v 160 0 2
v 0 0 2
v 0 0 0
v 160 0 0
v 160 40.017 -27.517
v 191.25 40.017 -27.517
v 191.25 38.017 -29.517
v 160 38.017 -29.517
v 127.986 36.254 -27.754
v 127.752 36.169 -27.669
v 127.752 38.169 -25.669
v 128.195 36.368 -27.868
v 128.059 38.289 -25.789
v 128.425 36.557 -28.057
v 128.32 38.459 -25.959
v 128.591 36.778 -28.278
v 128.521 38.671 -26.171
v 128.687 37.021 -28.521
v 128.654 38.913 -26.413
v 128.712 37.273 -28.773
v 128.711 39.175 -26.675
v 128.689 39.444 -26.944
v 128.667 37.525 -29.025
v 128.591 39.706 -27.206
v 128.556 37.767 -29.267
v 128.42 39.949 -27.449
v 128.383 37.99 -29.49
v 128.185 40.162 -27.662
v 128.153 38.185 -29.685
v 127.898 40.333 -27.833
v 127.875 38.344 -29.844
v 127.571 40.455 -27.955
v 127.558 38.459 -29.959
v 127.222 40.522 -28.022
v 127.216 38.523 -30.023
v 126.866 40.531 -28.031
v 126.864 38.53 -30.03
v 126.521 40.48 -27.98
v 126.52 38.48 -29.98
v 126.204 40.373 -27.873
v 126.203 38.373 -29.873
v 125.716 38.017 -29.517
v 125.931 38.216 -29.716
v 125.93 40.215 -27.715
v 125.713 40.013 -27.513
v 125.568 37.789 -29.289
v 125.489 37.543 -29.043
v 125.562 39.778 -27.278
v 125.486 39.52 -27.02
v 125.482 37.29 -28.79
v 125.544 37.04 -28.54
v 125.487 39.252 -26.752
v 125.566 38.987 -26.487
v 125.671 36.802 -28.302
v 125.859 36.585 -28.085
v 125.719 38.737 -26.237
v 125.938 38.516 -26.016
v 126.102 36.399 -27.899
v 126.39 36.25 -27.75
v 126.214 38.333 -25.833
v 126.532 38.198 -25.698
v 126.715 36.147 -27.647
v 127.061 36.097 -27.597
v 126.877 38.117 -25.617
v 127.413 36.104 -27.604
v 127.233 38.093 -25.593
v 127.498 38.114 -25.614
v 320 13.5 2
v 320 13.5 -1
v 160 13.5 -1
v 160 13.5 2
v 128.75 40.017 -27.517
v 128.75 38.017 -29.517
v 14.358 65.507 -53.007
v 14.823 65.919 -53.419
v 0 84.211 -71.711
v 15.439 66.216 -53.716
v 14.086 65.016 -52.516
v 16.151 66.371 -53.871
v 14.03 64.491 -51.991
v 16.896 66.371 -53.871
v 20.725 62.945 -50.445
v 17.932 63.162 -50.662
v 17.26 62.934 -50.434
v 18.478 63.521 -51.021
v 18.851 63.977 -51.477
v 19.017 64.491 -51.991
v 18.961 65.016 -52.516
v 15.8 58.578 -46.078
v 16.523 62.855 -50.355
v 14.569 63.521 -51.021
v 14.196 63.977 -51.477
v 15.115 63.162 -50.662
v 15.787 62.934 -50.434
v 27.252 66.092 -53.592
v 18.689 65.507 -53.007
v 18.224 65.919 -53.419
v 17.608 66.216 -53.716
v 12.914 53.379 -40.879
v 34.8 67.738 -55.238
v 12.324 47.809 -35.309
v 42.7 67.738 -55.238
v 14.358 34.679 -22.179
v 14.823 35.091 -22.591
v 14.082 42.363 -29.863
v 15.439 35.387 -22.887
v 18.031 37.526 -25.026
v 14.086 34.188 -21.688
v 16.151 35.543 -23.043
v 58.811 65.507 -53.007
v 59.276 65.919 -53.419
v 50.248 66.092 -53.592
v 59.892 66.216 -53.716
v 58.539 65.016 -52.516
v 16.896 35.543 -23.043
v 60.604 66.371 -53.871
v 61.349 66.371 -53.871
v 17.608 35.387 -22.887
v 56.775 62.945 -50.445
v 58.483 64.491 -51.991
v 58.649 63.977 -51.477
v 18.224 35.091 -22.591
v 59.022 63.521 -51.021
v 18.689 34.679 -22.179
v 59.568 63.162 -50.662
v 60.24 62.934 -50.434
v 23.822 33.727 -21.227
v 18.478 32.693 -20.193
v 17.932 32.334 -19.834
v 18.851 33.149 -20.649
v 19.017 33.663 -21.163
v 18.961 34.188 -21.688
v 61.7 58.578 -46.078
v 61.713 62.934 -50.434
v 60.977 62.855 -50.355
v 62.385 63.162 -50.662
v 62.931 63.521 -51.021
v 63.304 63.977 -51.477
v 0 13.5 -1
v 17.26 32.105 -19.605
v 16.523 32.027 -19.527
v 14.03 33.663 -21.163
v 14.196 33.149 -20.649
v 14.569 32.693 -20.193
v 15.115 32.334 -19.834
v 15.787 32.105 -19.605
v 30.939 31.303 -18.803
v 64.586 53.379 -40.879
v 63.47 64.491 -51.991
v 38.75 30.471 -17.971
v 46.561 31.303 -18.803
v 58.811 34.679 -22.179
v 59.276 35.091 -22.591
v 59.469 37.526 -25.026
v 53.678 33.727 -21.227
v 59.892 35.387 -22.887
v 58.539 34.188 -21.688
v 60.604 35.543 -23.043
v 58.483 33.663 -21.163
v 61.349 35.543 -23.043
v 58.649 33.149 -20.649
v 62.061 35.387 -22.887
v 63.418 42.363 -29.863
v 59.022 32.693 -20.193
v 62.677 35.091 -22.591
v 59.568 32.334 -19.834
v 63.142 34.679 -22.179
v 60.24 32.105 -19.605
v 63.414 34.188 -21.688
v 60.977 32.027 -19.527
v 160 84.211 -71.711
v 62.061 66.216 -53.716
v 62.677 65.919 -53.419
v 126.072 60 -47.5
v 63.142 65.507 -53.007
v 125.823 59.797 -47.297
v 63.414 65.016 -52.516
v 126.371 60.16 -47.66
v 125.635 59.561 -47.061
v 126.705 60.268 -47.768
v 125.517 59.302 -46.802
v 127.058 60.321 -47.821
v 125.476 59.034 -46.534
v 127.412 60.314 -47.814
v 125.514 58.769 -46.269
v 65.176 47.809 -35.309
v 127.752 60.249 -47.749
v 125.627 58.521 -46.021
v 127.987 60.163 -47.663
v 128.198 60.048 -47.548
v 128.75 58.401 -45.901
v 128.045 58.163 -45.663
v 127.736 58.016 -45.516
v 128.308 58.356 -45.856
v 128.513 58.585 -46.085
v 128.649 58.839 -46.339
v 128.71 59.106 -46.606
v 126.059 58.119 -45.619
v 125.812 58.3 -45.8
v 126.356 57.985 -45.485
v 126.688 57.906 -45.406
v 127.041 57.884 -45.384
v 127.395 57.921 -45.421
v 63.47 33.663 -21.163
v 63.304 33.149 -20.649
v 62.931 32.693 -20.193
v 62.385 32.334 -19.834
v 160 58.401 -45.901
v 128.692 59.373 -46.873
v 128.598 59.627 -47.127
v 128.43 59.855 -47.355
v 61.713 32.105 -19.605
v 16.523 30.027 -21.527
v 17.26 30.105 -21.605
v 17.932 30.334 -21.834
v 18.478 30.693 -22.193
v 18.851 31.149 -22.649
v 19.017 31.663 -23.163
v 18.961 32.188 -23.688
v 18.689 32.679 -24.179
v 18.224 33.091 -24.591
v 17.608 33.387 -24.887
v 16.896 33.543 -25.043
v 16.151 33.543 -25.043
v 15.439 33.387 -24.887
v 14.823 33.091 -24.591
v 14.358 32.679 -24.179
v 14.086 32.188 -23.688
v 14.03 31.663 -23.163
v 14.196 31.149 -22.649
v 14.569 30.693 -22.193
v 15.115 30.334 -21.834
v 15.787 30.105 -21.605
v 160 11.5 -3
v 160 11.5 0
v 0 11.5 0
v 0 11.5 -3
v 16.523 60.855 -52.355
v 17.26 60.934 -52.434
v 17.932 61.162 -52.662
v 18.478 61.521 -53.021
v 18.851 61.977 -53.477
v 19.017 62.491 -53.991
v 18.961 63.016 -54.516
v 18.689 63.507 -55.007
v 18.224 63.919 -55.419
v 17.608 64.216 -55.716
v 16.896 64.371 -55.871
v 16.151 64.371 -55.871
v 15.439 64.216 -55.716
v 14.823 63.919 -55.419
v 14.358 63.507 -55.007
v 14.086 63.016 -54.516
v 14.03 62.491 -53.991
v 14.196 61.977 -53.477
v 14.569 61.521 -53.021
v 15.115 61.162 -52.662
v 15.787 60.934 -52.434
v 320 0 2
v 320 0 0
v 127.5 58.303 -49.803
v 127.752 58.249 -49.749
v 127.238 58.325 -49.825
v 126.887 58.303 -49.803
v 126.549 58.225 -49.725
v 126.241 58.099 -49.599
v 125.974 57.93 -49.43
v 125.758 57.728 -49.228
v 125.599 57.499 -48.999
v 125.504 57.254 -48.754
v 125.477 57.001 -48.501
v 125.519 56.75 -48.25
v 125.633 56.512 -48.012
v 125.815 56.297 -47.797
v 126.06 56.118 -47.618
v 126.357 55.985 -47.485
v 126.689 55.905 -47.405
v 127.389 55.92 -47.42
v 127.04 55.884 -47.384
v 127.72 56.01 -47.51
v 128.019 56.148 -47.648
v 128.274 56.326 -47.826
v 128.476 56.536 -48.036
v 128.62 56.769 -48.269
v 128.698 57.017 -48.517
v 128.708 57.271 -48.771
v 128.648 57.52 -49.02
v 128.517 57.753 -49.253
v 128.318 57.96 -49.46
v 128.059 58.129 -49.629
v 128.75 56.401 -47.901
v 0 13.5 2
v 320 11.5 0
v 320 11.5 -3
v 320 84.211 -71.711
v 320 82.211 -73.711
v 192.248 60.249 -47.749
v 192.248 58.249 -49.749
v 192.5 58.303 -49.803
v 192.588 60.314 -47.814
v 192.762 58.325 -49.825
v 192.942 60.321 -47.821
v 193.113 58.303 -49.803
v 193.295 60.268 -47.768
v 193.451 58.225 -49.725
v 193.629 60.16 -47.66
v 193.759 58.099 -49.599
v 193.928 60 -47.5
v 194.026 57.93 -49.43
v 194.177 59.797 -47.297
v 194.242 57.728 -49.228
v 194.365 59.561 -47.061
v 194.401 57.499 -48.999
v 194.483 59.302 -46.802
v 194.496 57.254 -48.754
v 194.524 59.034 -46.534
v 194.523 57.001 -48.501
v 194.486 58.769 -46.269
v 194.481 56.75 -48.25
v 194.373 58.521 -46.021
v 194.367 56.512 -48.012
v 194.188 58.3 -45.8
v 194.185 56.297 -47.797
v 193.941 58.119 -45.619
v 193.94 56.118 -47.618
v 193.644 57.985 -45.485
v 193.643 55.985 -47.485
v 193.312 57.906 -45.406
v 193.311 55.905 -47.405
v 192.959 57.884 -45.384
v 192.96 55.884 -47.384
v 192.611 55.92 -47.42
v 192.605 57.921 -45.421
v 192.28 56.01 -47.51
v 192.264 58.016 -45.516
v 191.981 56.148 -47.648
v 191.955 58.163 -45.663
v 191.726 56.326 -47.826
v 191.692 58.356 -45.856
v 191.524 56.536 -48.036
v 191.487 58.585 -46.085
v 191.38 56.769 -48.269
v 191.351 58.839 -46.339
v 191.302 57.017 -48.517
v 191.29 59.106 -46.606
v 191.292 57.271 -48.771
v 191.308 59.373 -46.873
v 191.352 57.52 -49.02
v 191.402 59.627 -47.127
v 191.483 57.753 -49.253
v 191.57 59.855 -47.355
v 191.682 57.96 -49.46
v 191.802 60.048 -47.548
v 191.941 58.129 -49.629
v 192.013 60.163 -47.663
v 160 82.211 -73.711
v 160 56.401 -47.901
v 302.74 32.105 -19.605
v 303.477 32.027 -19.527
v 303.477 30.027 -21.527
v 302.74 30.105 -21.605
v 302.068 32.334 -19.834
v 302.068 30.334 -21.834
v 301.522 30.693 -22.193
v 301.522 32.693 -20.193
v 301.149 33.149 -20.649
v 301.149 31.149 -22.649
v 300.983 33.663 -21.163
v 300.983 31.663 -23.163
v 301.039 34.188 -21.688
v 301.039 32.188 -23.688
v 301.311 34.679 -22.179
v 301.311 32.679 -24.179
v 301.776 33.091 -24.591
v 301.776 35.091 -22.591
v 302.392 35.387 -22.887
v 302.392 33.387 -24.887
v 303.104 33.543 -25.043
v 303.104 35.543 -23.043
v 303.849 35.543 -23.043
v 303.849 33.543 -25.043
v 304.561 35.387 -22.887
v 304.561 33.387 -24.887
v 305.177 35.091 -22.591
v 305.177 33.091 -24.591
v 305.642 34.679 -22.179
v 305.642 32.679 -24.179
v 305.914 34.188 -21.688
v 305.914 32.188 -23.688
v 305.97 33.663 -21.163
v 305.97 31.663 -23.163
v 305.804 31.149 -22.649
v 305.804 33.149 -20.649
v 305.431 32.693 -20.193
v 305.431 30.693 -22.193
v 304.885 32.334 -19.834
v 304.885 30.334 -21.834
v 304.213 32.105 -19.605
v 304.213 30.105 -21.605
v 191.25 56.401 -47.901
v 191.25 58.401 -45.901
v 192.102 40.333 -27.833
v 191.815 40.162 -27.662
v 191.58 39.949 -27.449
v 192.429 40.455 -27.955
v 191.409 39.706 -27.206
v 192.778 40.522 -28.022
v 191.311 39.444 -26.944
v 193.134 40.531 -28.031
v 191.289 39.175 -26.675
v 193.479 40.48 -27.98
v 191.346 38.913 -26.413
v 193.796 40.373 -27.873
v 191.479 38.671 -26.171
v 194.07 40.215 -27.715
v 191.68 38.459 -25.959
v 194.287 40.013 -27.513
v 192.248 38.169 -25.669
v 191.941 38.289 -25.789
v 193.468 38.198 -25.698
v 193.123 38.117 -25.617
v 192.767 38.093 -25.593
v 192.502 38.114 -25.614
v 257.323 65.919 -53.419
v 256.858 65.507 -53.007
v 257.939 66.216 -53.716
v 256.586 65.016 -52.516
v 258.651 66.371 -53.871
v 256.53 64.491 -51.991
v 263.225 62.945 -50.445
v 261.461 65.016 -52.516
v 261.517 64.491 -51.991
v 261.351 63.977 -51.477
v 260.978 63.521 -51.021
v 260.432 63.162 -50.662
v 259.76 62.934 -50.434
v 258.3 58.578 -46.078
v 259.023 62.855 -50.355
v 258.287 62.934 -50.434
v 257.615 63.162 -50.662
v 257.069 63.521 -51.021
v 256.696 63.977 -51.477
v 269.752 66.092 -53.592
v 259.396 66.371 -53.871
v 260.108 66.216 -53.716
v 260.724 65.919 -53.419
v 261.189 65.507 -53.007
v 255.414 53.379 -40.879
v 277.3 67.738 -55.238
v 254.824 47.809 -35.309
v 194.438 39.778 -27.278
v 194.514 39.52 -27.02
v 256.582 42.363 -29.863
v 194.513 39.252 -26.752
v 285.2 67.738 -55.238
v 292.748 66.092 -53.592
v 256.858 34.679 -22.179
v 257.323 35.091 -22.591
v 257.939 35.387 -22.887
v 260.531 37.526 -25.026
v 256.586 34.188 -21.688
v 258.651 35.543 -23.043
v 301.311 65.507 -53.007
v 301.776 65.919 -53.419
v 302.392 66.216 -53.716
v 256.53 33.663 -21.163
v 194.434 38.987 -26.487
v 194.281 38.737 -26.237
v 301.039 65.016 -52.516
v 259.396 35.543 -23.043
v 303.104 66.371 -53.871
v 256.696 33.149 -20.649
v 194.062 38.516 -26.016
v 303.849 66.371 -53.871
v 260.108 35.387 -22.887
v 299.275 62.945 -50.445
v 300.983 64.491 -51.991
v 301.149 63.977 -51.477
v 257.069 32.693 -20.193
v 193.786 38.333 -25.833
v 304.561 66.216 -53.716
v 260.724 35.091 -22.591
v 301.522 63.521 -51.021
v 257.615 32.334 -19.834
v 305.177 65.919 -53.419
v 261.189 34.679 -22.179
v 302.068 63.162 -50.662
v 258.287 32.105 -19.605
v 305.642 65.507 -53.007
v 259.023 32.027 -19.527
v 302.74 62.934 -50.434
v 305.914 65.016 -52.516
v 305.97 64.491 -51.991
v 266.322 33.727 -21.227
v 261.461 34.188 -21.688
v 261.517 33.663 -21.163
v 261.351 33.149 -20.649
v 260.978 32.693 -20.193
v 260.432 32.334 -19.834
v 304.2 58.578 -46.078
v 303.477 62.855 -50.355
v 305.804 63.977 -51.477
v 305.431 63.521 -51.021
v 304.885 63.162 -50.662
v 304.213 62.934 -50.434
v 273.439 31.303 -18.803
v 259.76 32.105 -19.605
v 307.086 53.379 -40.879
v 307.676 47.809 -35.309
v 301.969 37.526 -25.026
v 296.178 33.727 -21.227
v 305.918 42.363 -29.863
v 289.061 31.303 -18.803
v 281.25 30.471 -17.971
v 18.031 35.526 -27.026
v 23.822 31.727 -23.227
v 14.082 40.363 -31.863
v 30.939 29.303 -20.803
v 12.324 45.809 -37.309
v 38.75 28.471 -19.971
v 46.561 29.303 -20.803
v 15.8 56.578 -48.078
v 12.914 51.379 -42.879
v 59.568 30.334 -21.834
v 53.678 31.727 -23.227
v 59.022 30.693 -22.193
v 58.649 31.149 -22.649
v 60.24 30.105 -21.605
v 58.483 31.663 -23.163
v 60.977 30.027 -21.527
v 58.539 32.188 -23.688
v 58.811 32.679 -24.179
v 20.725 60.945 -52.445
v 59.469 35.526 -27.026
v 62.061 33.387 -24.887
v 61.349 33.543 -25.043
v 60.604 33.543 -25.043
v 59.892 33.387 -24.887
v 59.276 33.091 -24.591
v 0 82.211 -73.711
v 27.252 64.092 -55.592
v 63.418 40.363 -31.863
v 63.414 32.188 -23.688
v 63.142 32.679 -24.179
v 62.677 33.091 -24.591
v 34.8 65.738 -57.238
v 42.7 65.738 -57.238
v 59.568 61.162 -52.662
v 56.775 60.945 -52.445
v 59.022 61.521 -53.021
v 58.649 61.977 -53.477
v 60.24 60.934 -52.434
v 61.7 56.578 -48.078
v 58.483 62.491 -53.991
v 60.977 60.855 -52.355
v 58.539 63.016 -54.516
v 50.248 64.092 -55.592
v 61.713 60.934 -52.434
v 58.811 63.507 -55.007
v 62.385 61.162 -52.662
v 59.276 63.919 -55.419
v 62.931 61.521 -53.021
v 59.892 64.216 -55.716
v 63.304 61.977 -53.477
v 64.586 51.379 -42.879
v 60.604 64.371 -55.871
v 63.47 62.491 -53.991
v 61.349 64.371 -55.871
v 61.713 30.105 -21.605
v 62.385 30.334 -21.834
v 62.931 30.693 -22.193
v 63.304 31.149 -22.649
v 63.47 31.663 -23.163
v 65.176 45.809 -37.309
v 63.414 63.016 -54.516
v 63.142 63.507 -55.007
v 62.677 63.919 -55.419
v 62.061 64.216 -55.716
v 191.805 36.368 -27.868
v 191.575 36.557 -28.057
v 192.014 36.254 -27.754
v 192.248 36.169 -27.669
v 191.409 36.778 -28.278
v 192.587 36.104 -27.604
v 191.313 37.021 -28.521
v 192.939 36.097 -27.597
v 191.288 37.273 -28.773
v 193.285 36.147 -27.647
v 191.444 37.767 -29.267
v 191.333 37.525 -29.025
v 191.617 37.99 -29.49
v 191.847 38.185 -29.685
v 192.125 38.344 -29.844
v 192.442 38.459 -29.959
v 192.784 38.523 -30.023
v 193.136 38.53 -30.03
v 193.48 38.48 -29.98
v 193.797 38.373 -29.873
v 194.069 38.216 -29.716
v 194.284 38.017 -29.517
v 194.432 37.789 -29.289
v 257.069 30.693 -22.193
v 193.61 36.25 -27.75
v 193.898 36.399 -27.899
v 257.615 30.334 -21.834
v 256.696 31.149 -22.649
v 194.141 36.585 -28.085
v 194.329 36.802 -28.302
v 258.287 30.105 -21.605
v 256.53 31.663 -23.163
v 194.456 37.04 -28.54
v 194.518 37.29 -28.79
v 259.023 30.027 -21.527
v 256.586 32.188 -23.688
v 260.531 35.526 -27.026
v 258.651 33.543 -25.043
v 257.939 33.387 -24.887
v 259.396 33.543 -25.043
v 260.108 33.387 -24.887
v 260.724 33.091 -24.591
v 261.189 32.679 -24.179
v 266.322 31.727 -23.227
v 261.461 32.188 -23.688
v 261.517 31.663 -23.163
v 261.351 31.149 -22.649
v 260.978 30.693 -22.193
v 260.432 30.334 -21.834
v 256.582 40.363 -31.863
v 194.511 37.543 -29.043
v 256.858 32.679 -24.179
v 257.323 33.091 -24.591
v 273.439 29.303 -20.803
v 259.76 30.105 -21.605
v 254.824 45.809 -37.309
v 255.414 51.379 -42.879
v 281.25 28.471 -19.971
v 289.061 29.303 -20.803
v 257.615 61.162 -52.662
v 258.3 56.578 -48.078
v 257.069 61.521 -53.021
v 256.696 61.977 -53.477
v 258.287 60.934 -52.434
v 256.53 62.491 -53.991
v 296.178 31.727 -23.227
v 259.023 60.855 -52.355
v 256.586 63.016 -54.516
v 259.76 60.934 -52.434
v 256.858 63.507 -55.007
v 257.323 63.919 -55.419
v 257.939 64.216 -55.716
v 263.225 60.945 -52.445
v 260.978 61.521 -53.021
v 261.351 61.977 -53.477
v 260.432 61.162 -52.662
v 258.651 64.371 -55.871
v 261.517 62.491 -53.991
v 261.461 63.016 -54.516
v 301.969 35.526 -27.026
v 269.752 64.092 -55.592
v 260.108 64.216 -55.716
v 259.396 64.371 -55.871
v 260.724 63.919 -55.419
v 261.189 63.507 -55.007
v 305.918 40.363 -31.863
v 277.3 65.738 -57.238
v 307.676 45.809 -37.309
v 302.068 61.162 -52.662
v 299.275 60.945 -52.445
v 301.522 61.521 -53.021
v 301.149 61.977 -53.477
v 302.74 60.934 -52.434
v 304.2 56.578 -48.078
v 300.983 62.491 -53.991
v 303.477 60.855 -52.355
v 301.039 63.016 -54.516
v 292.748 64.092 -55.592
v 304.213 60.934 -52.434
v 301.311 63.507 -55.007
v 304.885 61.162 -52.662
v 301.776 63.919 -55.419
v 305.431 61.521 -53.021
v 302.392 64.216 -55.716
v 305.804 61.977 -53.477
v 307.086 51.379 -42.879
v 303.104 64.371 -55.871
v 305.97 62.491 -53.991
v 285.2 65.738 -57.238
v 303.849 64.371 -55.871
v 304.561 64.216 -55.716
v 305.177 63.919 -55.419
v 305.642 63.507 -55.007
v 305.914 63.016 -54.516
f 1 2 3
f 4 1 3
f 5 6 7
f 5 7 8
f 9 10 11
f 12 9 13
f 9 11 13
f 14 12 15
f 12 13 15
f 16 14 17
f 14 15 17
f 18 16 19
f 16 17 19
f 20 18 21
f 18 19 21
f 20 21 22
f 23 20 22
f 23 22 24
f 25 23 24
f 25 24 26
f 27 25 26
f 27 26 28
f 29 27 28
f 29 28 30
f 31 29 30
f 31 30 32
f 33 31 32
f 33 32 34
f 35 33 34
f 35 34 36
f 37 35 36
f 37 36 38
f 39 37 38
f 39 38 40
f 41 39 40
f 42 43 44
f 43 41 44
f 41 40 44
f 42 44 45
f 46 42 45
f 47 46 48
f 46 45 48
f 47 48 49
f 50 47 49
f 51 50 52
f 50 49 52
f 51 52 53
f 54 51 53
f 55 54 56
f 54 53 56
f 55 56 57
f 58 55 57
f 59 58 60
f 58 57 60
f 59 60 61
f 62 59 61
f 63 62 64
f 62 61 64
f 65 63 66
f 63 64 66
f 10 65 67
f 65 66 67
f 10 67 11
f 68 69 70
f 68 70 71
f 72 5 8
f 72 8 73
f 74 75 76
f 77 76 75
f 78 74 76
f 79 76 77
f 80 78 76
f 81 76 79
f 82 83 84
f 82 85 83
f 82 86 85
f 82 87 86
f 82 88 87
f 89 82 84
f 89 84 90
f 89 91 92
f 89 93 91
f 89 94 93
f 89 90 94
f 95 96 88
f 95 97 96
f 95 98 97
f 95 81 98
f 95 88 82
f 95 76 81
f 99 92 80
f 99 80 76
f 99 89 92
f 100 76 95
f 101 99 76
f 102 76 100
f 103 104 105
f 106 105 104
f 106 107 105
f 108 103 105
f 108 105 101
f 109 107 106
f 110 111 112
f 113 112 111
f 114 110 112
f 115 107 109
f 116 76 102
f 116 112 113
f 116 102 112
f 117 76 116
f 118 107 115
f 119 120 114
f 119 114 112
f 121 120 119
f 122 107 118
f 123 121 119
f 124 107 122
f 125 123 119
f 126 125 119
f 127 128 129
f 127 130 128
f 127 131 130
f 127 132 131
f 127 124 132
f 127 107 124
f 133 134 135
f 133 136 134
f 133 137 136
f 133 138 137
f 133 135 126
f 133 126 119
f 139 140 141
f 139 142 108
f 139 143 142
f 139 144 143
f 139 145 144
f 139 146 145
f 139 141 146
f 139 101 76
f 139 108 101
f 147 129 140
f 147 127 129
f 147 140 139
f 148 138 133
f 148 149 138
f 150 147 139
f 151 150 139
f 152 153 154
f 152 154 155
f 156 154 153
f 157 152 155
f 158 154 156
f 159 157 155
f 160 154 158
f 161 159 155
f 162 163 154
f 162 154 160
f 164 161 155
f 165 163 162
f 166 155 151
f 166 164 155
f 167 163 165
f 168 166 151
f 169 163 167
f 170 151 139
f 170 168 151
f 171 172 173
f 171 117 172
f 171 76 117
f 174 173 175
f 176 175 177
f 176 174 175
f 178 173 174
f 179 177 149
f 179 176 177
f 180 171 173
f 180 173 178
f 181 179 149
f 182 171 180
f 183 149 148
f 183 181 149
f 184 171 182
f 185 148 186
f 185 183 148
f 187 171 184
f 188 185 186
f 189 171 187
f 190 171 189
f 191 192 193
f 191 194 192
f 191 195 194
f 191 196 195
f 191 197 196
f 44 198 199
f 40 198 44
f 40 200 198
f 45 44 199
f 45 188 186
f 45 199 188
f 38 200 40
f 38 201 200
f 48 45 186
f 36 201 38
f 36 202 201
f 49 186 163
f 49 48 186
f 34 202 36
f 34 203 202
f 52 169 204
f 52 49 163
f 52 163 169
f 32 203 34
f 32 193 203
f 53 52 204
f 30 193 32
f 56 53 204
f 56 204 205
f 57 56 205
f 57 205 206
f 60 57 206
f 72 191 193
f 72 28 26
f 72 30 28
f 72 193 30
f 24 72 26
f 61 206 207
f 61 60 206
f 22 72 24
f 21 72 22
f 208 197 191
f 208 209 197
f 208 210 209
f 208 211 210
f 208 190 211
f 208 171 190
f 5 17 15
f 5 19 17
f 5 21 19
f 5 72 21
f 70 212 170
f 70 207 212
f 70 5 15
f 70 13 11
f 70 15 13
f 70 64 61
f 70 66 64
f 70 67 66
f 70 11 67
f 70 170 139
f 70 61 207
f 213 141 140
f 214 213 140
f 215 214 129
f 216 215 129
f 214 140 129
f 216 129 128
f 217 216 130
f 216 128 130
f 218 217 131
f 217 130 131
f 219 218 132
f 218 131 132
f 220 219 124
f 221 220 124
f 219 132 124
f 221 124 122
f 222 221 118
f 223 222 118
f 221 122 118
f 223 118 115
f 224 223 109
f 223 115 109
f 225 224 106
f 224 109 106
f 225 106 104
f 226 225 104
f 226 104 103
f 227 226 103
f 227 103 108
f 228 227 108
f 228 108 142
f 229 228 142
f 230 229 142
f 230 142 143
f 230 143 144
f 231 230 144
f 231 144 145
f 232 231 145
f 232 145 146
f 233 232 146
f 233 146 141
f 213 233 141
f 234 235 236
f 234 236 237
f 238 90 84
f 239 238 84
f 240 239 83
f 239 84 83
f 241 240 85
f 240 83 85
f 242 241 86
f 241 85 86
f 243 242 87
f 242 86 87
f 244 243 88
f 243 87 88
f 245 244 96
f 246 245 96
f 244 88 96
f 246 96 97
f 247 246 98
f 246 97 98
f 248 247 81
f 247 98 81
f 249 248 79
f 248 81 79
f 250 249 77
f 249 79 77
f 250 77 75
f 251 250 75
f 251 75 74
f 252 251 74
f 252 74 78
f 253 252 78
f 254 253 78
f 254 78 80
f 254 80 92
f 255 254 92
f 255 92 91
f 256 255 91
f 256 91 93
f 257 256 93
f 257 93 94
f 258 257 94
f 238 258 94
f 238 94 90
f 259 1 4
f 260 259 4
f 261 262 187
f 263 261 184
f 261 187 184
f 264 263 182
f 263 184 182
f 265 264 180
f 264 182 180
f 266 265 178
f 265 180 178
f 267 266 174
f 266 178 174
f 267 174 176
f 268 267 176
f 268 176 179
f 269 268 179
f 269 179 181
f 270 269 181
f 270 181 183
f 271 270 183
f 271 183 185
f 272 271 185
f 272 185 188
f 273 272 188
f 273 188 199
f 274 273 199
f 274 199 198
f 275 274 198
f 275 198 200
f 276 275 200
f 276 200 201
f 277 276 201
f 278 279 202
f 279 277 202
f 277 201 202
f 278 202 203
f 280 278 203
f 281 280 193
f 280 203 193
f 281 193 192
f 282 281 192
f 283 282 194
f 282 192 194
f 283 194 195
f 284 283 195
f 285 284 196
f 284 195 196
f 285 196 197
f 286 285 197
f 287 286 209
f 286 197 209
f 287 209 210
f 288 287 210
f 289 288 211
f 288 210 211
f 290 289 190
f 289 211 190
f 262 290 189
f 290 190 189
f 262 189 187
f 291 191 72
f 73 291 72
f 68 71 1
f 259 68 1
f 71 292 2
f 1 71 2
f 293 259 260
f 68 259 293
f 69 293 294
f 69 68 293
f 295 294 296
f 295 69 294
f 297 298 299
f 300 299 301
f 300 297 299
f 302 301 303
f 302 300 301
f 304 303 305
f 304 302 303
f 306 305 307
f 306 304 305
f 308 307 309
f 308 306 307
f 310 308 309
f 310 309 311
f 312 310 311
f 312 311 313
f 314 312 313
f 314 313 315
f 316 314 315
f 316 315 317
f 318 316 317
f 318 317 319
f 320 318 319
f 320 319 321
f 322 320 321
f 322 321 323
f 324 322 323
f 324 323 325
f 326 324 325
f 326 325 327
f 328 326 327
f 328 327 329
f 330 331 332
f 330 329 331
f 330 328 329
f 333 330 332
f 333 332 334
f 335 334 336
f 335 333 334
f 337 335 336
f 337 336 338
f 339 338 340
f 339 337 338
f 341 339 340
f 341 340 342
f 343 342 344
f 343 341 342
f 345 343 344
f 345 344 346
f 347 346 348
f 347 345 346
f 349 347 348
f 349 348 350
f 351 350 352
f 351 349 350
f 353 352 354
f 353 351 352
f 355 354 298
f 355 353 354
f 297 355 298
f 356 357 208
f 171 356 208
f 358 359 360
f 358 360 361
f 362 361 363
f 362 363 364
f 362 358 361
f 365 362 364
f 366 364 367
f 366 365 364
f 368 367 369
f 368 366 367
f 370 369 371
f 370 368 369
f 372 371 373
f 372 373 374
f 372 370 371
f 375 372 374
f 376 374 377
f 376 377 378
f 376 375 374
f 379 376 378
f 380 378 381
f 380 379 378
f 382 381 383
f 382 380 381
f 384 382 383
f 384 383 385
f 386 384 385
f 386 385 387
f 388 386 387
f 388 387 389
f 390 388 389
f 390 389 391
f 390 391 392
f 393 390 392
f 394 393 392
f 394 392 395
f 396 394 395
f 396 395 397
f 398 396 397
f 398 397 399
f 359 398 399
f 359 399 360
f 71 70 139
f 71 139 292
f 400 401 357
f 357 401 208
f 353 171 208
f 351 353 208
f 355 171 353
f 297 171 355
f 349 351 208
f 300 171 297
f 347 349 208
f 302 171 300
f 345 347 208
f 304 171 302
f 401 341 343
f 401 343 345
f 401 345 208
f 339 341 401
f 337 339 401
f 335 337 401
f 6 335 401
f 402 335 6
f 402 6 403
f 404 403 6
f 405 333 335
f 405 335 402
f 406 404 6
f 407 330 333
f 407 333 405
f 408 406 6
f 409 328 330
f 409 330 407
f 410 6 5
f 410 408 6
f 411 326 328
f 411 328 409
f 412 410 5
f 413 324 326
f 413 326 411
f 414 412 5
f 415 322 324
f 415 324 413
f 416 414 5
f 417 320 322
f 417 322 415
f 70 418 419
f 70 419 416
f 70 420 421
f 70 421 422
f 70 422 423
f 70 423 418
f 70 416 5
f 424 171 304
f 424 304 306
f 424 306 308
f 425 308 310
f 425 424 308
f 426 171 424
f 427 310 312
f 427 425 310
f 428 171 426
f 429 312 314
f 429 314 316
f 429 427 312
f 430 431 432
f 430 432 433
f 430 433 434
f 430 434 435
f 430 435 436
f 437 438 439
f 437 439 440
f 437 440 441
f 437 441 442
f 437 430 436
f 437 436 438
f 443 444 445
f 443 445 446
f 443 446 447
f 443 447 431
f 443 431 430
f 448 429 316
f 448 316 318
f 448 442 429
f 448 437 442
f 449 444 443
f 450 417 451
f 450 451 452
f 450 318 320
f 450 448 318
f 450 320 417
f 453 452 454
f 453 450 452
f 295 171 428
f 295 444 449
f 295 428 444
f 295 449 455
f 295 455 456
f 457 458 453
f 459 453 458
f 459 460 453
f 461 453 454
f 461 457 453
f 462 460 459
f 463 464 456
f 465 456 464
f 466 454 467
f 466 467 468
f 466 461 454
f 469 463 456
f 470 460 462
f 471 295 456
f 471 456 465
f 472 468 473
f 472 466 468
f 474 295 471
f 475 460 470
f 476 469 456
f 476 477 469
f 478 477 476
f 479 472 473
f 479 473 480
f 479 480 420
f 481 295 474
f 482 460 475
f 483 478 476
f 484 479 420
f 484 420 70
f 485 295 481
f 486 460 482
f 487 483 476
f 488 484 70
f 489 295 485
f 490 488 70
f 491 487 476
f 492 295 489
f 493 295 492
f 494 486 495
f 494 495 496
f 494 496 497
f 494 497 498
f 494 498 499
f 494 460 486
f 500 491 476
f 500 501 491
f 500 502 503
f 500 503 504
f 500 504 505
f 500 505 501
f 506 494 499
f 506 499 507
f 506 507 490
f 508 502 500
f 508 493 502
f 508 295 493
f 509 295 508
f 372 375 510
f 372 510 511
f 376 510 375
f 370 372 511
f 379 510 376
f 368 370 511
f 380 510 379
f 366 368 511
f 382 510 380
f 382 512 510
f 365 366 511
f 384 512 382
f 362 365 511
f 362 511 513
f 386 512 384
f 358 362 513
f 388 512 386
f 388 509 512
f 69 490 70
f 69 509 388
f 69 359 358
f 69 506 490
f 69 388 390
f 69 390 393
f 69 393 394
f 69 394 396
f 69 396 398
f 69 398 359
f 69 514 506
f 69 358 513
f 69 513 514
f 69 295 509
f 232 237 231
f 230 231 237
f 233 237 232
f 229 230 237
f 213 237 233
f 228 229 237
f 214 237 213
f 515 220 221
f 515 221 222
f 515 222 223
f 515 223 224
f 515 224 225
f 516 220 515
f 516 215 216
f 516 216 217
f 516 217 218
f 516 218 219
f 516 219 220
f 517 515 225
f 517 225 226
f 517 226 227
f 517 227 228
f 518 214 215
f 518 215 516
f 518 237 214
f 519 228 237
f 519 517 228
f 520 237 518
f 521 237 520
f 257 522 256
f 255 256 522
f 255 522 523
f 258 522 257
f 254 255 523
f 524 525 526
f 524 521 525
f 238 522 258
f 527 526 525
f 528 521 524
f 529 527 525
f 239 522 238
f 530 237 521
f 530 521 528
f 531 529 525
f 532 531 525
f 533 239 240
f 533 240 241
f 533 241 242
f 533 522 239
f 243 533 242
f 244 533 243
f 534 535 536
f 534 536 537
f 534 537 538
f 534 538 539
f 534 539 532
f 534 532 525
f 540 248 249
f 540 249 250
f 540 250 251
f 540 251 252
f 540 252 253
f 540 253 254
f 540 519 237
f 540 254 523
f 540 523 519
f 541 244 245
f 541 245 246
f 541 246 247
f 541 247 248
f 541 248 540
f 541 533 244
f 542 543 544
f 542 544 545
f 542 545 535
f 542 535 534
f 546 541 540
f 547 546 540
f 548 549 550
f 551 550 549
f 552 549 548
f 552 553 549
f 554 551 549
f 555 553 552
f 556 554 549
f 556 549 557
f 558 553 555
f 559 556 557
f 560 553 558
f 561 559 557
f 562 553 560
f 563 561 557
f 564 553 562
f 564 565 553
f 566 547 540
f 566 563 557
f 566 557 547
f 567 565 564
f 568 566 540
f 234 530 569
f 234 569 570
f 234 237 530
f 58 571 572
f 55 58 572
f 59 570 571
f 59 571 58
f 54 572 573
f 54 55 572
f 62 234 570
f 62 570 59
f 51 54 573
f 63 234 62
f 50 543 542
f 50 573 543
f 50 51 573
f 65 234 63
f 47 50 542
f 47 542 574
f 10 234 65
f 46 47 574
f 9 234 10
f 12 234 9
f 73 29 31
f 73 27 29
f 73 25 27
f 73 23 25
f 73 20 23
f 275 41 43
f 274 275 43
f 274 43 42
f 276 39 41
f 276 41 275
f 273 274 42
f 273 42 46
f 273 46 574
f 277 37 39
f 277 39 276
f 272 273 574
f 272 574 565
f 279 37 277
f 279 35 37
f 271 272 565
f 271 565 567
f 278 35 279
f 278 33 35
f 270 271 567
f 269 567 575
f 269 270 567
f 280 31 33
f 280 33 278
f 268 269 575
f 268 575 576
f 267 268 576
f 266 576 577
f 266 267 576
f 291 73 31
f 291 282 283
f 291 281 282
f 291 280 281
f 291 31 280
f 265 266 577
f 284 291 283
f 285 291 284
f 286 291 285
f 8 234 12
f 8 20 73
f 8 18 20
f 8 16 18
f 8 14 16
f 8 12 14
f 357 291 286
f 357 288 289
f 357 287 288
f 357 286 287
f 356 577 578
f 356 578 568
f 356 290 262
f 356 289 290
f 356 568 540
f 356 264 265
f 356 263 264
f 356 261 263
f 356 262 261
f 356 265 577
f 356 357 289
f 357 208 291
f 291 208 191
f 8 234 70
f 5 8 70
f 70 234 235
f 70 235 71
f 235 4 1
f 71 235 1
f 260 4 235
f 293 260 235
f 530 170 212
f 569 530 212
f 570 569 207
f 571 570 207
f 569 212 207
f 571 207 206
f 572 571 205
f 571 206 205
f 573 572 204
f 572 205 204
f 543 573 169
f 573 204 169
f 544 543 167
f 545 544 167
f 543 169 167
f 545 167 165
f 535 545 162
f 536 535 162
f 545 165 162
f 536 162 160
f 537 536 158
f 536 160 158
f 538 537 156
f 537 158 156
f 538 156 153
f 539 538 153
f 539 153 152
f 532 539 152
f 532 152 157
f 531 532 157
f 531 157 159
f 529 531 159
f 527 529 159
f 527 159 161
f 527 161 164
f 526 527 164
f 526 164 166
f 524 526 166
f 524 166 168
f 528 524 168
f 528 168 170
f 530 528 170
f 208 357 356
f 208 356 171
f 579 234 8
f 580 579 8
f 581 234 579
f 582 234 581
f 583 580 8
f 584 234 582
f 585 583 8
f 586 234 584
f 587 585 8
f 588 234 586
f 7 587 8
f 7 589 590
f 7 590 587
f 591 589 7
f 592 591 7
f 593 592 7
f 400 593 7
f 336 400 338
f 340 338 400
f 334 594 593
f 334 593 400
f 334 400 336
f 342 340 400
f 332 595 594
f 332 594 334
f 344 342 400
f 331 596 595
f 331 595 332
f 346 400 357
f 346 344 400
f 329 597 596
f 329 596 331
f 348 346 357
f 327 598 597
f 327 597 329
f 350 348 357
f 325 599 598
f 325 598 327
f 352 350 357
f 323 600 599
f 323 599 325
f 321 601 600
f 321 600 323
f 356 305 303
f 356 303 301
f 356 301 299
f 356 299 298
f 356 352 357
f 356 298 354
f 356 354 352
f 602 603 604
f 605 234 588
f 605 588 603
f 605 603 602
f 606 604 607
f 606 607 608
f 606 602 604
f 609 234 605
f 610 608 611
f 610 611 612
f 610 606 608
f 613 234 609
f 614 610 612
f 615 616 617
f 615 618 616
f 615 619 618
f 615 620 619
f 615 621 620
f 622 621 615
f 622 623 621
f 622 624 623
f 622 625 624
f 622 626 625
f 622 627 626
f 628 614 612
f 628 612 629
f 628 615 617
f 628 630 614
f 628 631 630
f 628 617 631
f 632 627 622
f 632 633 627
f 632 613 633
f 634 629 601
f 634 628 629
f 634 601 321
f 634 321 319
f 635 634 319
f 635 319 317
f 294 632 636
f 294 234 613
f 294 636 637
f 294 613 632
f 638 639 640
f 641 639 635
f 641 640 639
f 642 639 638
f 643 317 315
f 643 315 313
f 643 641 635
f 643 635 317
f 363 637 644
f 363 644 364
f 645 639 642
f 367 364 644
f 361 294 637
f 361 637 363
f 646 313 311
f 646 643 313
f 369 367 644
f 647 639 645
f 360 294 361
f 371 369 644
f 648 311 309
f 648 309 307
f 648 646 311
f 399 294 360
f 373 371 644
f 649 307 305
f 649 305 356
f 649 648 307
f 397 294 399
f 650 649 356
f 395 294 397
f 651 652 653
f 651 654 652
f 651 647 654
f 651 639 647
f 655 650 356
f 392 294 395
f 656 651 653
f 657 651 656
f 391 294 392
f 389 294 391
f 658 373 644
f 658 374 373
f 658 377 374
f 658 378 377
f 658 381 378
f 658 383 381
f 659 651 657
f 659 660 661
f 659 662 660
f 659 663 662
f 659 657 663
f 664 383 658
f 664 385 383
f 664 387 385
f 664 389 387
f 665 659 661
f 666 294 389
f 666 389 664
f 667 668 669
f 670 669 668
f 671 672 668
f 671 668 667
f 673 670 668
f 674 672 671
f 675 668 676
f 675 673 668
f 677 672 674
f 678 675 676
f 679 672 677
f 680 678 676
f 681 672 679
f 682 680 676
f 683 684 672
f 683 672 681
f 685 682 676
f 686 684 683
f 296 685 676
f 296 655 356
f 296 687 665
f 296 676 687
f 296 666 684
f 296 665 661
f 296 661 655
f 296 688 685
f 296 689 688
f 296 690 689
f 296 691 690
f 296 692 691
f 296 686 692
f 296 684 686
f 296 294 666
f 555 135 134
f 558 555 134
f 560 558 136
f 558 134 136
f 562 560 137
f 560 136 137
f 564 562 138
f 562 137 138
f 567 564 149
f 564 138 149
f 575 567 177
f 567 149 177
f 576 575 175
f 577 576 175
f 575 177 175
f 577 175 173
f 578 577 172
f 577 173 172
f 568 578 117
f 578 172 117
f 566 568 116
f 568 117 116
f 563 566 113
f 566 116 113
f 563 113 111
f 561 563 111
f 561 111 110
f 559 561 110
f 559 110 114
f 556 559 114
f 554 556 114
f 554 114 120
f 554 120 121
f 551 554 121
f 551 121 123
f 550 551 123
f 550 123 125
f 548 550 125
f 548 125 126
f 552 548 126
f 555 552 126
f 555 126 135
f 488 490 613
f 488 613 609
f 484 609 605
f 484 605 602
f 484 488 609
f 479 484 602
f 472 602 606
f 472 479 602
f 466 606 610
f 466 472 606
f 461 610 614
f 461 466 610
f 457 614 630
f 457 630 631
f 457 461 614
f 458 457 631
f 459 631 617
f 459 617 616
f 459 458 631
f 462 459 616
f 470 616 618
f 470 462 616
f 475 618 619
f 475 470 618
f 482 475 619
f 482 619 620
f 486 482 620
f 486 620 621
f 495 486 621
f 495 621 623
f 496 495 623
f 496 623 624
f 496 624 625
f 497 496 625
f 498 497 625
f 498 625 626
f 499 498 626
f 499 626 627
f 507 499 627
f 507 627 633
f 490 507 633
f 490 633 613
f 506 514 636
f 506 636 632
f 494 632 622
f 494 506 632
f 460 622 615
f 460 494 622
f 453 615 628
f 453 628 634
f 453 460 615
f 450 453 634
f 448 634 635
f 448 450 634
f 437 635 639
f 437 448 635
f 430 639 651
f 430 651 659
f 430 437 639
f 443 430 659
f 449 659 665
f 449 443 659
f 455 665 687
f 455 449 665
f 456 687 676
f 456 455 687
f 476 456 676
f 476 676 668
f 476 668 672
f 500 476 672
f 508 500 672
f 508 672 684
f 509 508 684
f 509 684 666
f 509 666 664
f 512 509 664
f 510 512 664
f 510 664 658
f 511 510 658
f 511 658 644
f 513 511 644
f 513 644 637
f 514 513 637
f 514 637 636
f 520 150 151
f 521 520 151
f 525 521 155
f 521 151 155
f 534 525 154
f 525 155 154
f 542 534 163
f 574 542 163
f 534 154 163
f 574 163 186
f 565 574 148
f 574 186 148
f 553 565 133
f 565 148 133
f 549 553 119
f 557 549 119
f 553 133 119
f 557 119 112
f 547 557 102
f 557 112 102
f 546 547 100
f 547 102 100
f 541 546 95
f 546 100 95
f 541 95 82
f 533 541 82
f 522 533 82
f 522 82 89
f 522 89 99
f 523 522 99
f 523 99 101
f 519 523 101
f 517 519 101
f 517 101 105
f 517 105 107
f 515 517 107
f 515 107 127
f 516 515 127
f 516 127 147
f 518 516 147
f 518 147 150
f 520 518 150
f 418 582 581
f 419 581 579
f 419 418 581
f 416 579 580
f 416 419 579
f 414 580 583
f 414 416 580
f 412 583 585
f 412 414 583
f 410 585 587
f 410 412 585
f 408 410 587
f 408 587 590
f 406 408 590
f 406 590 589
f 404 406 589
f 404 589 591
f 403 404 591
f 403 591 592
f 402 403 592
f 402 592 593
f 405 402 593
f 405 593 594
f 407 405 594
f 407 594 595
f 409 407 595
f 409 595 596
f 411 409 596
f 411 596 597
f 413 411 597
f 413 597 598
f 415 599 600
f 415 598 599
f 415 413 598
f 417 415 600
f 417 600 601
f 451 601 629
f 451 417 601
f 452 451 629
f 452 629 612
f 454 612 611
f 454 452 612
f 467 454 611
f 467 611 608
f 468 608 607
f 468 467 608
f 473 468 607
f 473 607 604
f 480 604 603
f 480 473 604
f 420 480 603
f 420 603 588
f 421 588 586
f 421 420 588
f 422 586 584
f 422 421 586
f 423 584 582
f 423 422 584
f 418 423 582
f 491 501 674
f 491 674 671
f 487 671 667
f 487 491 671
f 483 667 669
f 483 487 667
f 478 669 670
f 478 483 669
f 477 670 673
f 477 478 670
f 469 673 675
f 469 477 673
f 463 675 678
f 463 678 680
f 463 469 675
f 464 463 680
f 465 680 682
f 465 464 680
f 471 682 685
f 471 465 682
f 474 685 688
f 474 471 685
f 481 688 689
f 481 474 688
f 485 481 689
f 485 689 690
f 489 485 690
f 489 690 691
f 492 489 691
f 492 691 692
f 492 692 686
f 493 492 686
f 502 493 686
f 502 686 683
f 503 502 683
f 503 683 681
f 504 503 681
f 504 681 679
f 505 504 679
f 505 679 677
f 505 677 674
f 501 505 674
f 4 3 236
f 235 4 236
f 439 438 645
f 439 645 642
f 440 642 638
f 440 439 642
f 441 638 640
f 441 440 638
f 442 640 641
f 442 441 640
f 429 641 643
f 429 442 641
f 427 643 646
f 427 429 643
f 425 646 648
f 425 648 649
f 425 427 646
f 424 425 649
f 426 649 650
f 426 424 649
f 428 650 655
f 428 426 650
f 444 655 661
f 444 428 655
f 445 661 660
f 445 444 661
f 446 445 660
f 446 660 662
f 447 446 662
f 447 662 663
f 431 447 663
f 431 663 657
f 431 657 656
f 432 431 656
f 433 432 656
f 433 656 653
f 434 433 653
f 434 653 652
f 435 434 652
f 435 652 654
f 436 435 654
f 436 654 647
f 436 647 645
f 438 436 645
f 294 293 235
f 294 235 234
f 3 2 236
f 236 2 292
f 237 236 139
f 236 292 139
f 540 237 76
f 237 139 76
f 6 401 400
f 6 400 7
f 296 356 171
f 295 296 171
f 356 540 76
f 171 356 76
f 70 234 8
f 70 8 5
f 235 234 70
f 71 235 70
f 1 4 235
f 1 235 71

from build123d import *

# Parameters (mm, degrees)
BOSS_EXTRUDE1_DEPTH = 160
BOSS_EXTRUDE2_DEPTH = 160
SKETCH4_W           = 31.25
SKETCH4_H           = 13.5
SKETCH4_H_2         = 12.5
CUT_EXTRUDE1_DEPTH  = 10
SKETCH5_RX          = 1.746988937
SKETCH5_RY          = 1.595946068
CUT_EXTRUDE2_DEPTH  = 10
SKETCH6_R           = 26.5
CUT_EXTRUDE3_DEPTH  = 10
SKETCH7_R           = 2.5
CUT_EXTRUDE4_DEPTH  = 10


with BuildPart() as part:
    # Sketch1 → Boss-Extrude1 (new body)
    with BuildSketch(Plane(origin=(0, 0, 0), x_dir=(0, 0, -1), z_dir=(1, 0, 0))):
        Polygon((0, 0), (0, 11.5), (3, 11.5), (3, 13.5), (-2, 13.5), (-2, 0), align=None)
    extrude(amount=BOSS_EXTRUDE1_DEPTH)

    # Sketch2 → Boss-Extrude2 (add)
    with BuildSketch(Plane(origin=(0, 0, 0), x_dir=(0, 0, -1), z_dir=(1, 0, 0))):
        Polygon((3, 13.5), (3, 11.5), (24.213203436, 32.713203436), (73.710678119, 82.210678119), (71.710678119, 84.210678119), (22.213203436, 34.713203436), (1, 13.5), align=None)
    extrude(amount=BOSS_EXTRUDE2_DEPTH)

    # Sketch4 → Cut-Extrude1 (cut)
    with BuildSketch(Plane(origin=(0, 6.25, 6.25), x_dir=(1, 0, 0), z_dir=(0, 0.7071067811865477, 0.7071067811865475))):
        with Locations((144.375, 67.003048327)):
            Rectangle(SKETCH4_W, SKETCH4_H)
        with Locations((144.375, 54.003048327)):
            Rectangle(SKETCH4_W, SKETCH4_H_2)
    extrude(amount=-CUT_EXTRUDE1_DEPTH, mode=Mode.SUBTRACT)

    # Sketch5 → Cut-Extrude2 (cut)
    with BuildSketch(Plane(origin=(0, 6.25, 6.25), x_dir=(1, 0, 0), z_dir=(0, 0.7071067811865477, 0.7071067811865475))):
        with Locations(Location((127.094534644, 74.747197969), (0, 0, 67.904979496))):
            Ellipse(SKETCH5_RX, SKETCH5_RY)
        with Locations(Location((127.094534644, 46.758898685), (0, 0, -67.904979496))):
            Ellipse(SKETCH5_RX, SKETCH5_RY)
    extrude(amount=-CUT_EXTRUDE2_DEPTH, mode=Mode.SUBTRACT)

    # Sketch6 → Cut-Extrude3 (cut)
    with BuildSketch(Plane(origin=(0, 6.25, 6.25), x_dir=(1, 0, 0), z_dir=(0, 0.7071067811865477, 0.7071067811865475))):
        with Locations(Location((38.75, 60.753048327, 0), (0, 0, 270))):
            Circle(SKETCH6_R)
    extrude(amount=-CUT_EXTRUDE3_DEPTH, mode=Mode.SUBTRACT)

    # Sketch7 → Cut-Extrude4 (cut)
    with BuildSketch(Plane(origin=(0, 6.25, 6.25), x_dir=(1, 0, 0), z_dir=(0, 0.7071067811865477, 0.7071067811865475))):
        with Locations(Location((16.523498497, 82.551969583, 0), (0, 0, 270))):
            Circle(SKETCH7_R)
        with Locations(Location((60.976501503, 82.551969583, 0), (0, 0, 270))):
            Circle(SKETCH7_R)
        with Locations(Location((60.976501503, 38.954127071, 0), (0, 0, 270))):
            Circle(SKETCH7_R)
        with Locations(Location((16.523498497, 38.954127071, 0), (0, 0, 270))):
            Circle(SKETCH7_R)
    extrude(amount=-CUT_EXTRUDE4_DEPTH, mode=Mode.SUBTRACT)

    # Mirror4: part across plane


with BuildPart() as part_1:
    add(part.part)
    add(part.part.mirror(Plane(origin=(160, 0, 0), x_dir=(0, 0, 1), z_dir=(1, 0, 0))))


with BuildPart() as body_2:
    # Split2: the piece on the far side of the plane
    add(part_1.part)
    split(bisect_by=Plane(origin=(160, 0, 0), x_dir=(0, 0, 1), z_dir=(1, 0, 0)), keep=Keep.BOTTOM)


with BuildPart() as part_2:
    add(part_1.part)

    # Split2
    split(bisect_by=Plane(origin=(160, 0, 0), x_dir=(0, 0, 1), z_dir=(1, 0, 0)), keep=Keep.TOP)


solid = Compound([body_2.part, part_2.part])
